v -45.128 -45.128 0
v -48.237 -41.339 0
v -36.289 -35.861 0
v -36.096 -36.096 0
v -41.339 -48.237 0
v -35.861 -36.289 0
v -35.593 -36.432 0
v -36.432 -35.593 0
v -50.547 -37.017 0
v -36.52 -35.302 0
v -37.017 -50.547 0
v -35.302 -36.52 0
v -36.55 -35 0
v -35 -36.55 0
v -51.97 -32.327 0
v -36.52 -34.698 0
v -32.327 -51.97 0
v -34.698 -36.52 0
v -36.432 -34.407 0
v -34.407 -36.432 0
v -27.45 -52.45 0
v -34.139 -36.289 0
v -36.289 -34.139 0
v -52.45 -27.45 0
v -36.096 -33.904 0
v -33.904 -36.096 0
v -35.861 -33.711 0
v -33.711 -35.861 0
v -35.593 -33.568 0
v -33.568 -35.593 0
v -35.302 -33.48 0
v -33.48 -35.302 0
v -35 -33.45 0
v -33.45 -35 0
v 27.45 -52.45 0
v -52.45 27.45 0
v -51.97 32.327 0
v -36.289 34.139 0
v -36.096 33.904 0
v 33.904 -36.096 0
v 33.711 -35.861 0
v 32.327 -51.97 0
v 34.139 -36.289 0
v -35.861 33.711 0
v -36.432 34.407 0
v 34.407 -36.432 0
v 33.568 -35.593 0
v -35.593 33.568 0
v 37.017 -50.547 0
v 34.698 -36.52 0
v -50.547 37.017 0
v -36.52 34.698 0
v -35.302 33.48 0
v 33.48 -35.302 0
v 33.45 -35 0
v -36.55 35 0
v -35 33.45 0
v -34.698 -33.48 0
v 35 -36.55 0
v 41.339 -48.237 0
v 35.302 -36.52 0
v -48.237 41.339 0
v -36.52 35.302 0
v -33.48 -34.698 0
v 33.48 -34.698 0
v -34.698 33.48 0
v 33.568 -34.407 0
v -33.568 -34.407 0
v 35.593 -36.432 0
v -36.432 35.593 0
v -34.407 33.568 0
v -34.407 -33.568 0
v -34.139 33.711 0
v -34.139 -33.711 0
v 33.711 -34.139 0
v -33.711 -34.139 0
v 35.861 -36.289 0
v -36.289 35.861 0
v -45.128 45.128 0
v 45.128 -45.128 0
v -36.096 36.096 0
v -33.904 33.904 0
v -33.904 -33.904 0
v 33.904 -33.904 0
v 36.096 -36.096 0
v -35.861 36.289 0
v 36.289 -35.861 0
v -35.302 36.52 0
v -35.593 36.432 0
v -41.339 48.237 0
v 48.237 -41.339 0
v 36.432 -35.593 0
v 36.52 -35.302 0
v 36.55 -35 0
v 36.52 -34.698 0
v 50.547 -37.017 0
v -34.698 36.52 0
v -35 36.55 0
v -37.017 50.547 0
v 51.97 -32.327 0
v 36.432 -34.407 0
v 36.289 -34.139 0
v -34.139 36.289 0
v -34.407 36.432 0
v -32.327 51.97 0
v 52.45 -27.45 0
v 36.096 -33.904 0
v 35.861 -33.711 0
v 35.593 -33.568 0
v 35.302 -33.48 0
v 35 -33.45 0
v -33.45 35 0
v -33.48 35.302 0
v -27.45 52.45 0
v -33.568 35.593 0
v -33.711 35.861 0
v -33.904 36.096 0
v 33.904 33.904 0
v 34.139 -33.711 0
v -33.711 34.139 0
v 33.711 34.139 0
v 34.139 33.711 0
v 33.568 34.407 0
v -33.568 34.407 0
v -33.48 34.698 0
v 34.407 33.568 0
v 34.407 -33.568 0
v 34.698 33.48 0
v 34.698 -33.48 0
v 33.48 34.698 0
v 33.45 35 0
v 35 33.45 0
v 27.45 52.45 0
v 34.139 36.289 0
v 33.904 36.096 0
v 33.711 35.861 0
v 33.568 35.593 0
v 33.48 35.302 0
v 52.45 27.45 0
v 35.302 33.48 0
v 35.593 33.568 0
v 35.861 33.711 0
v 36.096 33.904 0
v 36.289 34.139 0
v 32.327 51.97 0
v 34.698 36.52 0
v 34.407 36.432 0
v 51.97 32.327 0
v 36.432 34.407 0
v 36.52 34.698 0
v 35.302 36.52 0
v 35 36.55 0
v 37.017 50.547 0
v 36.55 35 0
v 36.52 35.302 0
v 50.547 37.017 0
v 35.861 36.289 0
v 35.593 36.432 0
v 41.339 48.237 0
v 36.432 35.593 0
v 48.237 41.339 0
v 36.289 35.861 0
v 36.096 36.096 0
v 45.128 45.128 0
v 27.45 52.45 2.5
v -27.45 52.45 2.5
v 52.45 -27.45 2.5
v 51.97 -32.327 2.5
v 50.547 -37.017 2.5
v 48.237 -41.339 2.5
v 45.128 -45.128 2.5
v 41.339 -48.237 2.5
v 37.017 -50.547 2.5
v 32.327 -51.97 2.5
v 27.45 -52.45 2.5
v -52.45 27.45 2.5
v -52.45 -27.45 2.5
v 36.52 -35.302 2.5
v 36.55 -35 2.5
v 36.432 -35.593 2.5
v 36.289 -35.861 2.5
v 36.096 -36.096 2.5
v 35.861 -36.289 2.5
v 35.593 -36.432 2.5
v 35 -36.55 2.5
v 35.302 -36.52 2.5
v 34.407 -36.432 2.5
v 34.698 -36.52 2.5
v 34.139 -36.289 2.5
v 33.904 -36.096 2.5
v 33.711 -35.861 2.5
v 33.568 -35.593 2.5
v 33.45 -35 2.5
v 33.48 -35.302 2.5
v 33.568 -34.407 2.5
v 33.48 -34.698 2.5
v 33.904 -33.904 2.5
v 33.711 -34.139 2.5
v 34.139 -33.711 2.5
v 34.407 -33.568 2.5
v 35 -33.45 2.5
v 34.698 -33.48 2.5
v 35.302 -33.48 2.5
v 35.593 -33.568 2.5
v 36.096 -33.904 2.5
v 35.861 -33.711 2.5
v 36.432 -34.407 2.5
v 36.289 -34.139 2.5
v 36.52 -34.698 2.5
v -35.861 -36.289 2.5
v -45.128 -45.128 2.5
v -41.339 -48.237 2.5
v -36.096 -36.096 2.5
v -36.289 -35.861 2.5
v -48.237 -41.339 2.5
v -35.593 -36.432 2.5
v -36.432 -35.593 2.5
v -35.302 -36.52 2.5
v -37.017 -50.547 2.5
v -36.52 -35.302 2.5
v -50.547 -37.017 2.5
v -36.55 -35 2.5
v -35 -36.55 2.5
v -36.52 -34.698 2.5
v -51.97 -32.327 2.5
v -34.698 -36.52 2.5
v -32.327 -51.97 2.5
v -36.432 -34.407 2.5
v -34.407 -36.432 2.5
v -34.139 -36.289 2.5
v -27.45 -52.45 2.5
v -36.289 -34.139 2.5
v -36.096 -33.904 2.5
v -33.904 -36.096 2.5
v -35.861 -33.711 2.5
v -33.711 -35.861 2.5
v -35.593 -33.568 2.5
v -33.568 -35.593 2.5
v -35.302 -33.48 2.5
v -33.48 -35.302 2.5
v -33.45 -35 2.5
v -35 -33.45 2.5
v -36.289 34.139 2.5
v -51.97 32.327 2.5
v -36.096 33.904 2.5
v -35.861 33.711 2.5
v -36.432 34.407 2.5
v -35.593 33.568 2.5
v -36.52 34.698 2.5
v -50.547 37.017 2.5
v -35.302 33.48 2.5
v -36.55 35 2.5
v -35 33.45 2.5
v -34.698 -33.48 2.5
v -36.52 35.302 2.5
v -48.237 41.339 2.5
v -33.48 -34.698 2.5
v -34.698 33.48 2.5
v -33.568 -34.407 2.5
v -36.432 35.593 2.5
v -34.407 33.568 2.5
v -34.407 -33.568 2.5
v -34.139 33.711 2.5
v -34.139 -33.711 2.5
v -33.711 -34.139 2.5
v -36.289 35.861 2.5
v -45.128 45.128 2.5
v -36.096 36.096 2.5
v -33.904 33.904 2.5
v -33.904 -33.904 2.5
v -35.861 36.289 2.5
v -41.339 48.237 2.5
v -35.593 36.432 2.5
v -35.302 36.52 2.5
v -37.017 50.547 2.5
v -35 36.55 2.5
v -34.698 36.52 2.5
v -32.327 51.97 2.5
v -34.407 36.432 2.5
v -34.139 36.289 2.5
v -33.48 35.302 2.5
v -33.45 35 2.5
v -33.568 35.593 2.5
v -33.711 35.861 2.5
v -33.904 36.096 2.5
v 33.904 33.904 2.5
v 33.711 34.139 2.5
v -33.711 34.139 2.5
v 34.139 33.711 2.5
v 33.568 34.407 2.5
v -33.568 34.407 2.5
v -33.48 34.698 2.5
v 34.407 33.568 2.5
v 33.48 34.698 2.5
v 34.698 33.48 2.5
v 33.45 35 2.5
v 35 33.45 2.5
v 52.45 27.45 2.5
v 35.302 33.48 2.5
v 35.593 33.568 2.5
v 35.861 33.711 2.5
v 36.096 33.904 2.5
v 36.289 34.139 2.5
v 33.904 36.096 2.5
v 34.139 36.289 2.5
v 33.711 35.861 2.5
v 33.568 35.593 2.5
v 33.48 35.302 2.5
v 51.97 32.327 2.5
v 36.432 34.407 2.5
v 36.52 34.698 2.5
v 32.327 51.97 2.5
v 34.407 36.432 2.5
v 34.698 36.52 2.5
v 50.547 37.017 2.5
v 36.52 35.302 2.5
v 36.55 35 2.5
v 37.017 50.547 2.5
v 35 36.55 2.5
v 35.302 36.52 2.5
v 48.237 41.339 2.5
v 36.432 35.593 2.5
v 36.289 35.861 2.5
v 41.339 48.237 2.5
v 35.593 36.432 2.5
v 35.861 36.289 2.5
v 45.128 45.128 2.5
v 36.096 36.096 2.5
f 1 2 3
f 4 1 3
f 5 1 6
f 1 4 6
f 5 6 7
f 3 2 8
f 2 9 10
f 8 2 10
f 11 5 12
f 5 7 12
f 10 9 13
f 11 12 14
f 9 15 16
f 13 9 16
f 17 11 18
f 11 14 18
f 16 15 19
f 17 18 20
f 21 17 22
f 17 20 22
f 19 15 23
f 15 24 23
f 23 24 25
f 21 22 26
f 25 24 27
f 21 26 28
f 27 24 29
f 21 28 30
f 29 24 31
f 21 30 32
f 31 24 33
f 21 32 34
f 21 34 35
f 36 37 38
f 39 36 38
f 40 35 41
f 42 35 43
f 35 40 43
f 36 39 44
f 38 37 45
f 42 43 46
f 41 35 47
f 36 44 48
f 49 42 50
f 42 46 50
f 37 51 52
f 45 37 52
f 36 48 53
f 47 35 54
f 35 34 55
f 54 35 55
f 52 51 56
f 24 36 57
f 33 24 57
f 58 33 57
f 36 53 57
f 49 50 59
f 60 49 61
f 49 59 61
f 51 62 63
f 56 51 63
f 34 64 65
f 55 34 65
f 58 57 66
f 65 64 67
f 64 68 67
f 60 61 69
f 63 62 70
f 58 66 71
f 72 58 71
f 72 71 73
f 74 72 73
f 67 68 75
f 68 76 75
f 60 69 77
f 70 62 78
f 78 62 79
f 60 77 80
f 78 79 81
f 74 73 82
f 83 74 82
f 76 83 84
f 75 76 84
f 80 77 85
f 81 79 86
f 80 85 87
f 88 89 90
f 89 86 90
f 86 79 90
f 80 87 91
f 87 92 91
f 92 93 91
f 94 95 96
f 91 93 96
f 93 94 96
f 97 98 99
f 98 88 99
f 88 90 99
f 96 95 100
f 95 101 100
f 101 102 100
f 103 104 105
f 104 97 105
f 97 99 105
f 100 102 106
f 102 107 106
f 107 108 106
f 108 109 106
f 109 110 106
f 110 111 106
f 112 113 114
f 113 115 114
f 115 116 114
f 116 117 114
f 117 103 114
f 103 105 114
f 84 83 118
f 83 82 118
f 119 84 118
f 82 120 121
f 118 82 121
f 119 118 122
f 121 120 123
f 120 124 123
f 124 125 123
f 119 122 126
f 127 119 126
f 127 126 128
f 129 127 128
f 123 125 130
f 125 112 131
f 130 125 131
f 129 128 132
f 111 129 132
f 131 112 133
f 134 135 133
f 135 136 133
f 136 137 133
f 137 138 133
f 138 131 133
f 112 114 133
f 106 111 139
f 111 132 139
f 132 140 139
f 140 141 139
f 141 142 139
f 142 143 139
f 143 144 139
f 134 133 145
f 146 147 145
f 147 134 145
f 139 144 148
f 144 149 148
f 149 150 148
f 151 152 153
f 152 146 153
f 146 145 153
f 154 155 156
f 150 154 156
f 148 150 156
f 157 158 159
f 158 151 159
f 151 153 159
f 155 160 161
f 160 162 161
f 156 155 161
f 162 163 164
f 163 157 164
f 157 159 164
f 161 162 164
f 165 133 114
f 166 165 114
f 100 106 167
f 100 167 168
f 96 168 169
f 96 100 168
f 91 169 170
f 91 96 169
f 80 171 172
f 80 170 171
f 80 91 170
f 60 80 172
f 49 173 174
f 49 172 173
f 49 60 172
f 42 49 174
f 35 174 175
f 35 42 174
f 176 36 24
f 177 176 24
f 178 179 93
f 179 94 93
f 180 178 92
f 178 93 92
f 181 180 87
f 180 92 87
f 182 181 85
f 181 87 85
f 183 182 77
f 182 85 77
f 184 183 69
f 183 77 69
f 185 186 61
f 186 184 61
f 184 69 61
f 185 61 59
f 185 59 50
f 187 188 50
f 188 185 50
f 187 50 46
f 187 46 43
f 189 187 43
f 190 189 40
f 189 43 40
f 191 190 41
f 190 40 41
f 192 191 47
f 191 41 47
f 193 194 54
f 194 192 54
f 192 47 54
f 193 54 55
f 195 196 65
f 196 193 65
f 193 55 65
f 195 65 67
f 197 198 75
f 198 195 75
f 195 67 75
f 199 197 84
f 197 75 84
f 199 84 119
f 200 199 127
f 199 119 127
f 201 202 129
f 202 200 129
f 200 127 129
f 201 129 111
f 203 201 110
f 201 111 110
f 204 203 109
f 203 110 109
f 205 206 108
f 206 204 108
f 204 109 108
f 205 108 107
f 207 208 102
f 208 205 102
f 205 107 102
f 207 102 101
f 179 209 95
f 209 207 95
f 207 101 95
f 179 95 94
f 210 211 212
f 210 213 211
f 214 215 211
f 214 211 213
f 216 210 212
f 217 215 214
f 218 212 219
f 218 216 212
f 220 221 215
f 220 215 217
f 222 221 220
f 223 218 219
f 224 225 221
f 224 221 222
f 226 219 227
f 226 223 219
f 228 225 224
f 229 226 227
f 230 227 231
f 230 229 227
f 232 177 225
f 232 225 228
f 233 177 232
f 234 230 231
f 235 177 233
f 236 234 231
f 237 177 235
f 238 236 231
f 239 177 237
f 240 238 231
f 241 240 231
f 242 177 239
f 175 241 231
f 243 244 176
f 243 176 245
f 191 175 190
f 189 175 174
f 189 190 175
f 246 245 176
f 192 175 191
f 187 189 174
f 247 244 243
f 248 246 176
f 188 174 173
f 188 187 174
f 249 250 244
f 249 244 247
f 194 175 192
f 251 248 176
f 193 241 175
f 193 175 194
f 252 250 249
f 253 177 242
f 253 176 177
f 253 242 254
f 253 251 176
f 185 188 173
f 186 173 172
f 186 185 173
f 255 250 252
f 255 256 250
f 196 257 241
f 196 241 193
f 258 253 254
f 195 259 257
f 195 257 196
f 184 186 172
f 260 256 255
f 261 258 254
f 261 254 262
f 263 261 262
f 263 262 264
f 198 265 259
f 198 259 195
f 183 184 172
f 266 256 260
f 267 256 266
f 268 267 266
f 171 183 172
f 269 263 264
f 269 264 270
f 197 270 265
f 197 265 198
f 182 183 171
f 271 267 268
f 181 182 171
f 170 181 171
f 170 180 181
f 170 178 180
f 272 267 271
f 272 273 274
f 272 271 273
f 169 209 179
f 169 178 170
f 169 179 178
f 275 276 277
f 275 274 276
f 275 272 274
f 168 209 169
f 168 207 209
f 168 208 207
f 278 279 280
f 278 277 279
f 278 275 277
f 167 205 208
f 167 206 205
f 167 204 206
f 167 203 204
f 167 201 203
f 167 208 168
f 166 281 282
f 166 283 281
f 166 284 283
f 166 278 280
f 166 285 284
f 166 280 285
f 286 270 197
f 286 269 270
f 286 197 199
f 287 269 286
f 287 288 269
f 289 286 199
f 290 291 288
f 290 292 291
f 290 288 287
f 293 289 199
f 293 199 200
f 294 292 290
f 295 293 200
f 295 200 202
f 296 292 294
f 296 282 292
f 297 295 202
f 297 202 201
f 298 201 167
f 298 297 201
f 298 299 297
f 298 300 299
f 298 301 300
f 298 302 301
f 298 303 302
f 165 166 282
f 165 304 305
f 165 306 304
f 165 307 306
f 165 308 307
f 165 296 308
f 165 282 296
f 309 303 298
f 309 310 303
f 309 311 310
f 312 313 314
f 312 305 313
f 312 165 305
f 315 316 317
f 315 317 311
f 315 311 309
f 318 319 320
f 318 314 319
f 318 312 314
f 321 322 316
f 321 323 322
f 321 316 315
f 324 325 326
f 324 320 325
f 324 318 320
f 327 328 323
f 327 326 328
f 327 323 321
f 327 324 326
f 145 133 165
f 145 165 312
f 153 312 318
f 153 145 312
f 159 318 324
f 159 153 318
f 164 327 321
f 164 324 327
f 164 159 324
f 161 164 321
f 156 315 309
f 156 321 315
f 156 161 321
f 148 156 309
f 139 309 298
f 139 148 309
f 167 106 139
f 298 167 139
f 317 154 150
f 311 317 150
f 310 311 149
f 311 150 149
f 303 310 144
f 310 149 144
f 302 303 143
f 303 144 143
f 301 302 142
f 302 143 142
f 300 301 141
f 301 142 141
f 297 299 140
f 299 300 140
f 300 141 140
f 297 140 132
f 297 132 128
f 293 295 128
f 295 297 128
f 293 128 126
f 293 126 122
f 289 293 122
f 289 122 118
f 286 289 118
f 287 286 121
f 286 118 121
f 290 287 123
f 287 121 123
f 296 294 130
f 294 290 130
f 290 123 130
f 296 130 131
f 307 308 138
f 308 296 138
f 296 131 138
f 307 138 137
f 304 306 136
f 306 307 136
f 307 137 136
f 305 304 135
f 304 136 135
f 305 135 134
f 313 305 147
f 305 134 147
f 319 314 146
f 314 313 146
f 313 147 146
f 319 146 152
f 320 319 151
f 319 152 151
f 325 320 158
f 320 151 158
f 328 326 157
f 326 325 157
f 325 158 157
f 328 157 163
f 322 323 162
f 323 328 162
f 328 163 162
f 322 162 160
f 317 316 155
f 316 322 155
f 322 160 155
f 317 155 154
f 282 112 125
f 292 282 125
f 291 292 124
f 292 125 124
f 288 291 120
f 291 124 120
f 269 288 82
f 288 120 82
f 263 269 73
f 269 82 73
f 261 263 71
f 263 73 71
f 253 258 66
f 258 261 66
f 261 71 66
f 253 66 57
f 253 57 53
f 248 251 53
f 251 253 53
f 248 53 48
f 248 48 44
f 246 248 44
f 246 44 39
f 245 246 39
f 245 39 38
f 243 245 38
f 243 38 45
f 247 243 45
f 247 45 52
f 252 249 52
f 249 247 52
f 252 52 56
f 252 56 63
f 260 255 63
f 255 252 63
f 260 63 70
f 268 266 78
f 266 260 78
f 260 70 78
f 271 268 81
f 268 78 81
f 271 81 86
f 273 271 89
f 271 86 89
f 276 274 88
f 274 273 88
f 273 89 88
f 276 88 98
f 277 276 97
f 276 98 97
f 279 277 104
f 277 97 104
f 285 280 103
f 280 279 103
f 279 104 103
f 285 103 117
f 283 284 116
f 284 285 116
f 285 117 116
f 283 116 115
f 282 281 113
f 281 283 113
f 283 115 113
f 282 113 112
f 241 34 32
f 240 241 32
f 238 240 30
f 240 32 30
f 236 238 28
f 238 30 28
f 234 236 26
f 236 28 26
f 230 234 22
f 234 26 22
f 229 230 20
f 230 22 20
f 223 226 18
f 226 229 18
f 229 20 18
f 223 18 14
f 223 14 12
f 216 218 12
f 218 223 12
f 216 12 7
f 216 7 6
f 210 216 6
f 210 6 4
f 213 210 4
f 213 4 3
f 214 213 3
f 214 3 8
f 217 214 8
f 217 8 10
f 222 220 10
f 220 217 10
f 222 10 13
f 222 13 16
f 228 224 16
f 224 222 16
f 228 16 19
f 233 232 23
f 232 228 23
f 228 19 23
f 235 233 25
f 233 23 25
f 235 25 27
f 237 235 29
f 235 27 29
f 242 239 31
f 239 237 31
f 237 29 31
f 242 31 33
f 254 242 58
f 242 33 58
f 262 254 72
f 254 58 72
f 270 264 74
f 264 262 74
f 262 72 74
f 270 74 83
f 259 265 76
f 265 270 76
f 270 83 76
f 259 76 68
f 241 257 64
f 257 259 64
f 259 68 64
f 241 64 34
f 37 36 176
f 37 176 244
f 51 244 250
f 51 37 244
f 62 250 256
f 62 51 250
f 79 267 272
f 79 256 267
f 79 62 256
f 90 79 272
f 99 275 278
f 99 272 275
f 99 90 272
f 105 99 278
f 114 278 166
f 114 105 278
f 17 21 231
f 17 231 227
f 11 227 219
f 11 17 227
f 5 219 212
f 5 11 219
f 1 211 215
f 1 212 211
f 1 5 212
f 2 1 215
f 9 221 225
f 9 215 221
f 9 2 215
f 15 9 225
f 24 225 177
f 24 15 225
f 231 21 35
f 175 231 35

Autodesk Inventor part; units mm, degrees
ref_plane "YZ Plane" through (0, 0, 0) normal (1, 0, 0) x (0, 1, 0)
ref_plane "XZ Plane" through (0, 0, 0) normal (0, 1, 0) x (-1, 0, 0)
ref_plane "XY Plane" through (0, 0, 0) normal (0, 0, 1) x (1, 0, 0)
sketch "Sketch1" plane through (0, 0, 0) normal (0, 0, 1) x (1, 0, 0)
  line L0 (-27.45, -52.45) -> (27.45, -52.45)
  line L1 (52.45, -27.45) -> (52.45, 27.45)
  line L2 (27.45, 52.45) -> (-27.45, 52.45)
  line L3 (-52.45, 27.45) -> (-52.45, -27.45)
  line L4 (-52.45, -52.45) -> (52.45, 52.45) construction
  line L5 (52.45, -52.45) -> (-52.45, 52.45) construction
  arc A0 (-27.45, 52.45) -> (-52.45, 27.45) centre (-27.45, 27.45) ccw
  arc A1 (-52.45, -27.45) -> (-27.45, -52.45) centre (-27.45, -27.45) ccw
  arc A2 (27.45, -52.45) -> (52.45, -27.45) centre (27.45, -27.45) ccw
  arc A3 (52.45, 27.45) -> (27.45, 52.45) centre (27.45, 27.45) ccw
  line L6 (-35, 35) -> (35, 35) construction
  line L7 (35, 35) -> (35, -35) construction
  line L8 (35, -35) -> (-35, -35) construction
  line L9 (-35, -35) -> (-35, 35) construction
  line L10 (-35, 35) -> (35, -35) construction
  line L11 (35, 35) -> (-35, -35) construction
  circle A4 centre (35, 35) radius 1.55
  circle A5 centre (35, -35) radius 1.55
  circle A6 centre (-35, -35) radius 1.55
  circle A7 centre (-35, 35) radius 1.55
  point P0 (0, 0)
  dimension "d0" = 104.9
  dimension "d1" = 104.9
  dimension "d2" = 25
  dimension "d6" = 70
  dimension "d7" = 3.1
extrude "Extrusion1" add sketch "Sketch1" along normal blind 2.5
equation "\"d1\" = d0"
properties part number "NewFront_D"
